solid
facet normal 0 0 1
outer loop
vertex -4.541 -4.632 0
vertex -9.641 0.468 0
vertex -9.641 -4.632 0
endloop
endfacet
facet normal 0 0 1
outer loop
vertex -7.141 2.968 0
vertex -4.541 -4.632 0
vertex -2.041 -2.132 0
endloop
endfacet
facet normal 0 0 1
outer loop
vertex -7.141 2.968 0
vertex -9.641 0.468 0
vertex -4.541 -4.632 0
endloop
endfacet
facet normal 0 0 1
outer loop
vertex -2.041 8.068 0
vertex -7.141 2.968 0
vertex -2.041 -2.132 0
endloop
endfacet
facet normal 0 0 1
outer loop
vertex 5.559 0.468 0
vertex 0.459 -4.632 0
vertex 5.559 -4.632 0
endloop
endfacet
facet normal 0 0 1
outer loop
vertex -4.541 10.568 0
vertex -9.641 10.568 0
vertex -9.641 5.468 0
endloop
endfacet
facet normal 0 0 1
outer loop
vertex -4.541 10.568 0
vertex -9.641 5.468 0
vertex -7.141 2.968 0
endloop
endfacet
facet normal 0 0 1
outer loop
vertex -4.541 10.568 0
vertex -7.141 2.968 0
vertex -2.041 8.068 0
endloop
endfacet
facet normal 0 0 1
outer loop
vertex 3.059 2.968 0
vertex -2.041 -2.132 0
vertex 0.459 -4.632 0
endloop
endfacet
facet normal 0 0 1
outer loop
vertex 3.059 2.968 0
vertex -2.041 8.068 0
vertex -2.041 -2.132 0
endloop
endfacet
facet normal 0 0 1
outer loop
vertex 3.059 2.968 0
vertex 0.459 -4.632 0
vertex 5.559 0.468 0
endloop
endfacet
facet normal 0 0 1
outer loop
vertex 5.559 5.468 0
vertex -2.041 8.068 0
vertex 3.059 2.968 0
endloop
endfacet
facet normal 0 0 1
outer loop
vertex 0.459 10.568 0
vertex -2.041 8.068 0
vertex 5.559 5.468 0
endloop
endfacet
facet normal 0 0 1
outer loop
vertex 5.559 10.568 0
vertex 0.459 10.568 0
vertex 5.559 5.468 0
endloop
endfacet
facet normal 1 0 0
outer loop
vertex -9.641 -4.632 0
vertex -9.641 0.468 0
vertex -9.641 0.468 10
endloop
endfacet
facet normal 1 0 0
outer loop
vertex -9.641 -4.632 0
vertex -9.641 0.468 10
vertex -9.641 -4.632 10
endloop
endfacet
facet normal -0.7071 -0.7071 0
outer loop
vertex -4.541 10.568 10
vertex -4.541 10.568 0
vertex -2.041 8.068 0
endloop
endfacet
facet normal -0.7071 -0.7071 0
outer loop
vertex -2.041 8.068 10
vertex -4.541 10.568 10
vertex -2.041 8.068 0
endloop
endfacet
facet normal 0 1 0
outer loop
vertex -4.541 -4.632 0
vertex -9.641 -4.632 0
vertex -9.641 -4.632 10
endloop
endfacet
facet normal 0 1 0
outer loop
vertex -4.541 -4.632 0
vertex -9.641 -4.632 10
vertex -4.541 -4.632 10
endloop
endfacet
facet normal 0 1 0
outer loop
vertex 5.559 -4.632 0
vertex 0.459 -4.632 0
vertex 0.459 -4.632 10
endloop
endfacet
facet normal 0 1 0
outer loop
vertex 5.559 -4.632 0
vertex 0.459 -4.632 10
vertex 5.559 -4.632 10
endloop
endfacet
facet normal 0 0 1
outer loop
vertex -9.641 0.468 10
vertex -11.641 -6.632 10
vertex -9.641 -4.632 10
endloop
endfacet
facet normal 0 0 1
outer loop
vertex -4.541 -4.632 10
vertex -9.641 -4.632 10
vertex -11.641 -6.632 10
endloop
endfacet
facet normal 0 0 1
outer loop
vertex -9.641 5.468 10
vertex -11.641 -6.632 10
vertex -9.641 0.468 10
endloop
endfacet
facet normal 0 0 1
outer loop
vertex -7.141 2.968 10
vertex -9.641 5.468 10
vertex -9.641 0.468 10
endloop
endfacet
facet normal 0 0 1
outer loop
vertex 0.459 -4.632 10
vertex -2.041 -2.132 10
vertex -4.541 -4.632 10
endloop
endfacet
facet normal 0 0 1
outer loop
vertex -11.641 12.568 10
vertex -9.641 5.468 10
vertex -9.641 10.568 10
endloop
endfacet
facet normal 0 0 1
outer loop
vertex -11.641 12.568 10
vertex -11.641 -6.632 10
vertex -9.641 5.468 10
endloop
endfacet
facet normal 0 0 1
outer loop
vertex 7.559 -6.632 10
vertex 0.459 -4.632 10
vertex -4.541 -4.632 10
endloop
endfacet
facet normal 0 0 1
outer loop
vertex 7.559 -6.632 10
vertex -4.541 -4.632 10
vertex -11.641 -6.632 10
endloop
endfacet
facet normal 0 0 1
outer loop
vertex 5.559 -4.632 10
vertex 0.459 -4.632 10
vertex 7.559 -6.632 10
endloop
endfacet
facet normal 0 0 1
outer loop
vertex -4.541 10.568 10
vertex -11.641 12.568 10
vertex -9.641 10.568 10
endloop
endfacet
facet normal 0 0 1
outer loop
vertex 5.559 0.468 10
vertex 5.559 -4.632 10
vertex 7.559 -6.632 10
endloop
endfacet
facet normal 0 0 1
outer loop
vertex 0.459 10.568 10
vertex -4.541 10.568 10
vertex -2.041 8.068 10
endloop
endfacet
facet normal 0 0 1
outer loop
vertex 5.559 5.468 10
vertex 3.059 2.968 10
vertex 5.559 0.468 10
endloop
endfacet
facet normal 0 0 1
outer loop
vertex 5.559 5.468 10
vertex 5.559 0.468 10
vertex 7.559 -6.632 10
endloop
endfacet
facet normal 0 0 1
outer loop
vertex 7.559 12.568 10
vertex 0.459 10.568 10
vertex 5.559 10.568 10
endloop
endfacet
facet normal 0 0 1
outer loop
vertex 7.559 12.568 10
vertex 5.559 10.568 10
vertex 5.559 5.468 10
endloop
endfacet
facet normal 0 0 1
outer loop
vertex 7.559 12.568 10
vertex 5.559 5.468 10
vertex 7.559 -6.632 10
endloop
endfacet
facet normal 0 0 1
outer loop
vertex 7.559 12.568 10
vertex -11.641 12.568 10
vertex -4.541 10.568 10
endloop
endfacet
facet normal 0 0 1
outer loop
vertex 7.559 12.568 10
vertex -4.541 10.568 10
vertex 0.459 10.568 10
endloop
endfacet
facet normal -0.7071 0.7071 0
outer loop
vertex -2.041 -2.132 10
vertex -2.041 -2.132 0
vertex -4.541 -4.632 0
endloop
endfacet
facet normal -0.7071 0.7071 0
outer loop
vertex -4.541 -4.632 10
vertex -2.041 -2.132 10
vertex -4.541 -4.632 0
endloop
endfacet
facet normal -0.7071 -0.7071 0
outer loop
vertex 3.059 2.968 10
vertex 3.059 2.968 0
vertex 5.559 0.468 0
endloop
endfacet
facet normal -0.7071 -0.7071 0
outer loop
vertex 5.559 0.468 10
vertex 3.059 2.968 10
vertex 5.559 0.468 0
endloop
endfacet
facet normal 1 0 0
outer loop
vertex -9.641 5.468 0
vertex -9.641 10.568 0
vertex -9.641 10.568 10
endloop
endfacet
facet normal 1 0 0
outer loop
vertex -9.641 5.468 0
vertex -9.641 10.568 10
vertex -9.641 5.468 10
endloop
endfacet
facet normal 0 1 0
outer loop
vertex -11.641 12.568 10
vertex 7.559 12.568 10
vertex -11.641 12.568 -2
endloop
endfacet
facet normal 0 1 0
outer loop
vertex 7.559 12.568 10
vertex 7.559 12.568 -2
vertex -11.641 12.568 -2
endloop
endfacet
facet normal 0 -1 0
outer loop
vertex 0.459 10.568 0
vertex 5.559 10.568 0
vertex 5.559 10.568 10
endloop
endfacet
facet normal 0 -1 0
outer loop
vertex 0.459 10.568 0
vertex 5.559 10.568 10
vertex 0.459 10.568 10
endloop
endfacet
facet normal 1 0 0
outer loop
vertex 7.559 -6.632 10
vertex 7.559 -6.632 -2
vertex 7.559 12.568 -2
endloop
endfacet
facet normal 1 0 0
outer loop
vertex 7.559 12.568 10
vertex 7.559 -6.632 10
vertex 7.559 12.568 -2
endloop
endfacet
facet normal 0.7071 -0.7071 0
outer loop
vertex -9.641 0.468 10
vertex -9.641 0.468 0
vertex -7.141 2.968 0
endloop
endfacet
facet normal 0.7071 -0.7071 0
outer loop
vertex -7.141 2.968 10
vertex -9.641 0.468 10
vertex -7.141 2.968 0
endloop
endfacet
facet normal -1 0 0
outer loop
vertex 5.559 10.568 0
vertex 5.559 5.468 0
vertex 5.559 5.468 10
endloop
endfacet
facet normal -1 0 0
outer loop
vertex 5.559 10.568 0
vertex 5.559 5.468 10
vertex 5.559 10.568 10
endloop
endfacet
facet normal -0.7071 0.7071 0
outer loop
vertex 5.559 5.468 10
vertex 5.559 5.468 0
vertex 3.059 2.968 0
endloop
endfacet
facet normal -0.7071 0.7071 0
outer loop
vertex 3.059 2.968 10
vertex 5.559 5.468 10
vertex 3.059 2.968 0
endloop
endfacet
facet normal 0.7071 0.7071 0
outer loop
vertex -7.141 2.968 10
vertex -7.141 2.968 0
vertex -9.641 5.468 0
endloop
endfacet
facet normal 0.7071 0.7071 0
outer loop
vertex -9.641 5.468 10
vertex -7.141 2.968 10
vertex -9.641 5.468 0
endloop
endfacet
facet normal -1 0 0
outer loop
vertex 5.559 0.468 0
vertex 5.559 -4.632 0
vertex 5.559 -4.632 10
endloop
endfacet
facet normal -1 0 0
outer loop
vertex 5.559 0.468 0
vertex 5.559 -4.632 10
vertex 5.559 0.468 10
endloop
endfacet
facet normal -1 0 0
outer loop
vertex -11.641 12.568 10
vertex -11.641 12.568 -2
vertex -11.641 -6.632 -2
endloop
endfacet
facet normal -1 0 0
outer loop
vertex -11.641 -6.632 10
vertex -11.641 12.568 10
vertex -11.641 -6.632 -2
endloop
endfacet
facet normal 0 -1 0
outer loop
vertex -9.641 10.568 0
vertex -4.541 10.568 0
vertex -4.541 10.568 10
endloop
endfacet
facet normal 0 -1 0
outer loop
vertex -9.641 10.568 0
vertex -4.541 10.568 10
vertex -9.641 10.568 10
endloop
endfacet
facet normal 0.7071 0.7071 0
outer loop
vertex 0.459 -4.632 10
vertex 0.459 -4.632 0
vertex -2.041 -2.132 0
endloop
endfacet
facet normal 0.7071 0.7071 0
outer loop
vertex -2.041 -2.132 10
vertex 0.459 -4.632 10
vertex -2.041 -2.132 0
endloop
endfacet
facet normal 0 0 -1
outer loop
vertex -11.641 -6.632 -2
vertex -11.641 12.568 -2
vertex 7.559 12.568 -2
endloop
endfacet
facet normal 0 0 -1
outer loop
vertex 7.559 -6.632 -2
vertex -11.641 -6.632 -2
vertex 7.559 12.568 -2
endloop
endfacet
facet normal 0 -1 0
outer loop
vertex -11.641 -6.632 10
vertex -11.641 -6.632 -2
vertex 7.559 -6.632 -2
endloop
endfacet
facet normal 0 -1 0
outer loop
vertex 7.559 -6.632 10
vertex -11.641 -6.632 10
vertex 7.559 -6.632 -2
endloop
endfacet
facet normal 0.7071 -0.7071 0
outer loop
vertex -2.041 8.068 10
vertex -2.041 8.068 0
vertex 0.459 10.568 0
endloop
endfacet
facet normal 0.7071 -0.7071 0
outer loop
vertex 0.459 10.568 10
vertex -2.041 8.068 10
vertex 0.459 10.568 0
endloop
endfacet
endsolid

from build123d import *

# Parameters (mm, degrees)
F1_DEPTH = 10
F2_T     = 2
F3_DEPTH = 10


with BuildPart() as f1:
    # F0 (on Top) → F1 (new body)
    with BuildSketch(Plane.XY):
        Polygon((-4.5411753677, 10.567646683), (-9.6411753677, 10.567646683), (-9.6411753677, 5.467646683), (-7.1411753677, 2.967646683), (-9.6411753677, 0.467646683), (-9.6411753677, -4.632353317), (-4.5411753677, -4.632353317), (-2.0411753677, -2.132353317), (0.4588246323, -4.632353317), (5.5588246323, -4.632353317), (5.5588246323, 0.467646683), (3.0588246323, 2.967646683), (5.5588246323, 5.467646683), (5.5588246323, 10.567646683), (0.4588246323, 10.567646683), (-2.0411753677, 8.067646683), align=None)
        Polygon((-7.1411753677, 2.967646683), (-9.6411753677, 5.467646683), (-9.6411753677, 0.467646683), align=None)
        Polygon((-2.0411753677, -2.132353317), (-4.5411753677, -4.632353317), (0.4588246323, -4.632353317), align=None)
        Polygon((5.5588246323, 0.467646683), (5.5588246323, 5.467646683), (3.0588246323, 2.967646683), align=None)
        Polygon((0.4588246323, 10.567646683), (-4.5411753677, 10.567646683), (-2.0411753677, 8.067646683), align=None)
    extrude(amount=F1_DEPTH)

    # F2
    f2_openings = [f1.faces().sort_by_distance(p)[0] for p in [
        (-2.041175, 2.967647, 10),
    ]]
    offset(amount=F2_T, openings=f2_openings, kind=Kind.INTERSECTION)

    # F0 (on Top) → F3 (join)
    with BuildSketch(Plane.XY):
        Polygon((0.4588246323, 10.567646683), (-4.5411753677, 10.567646683), (-2.0411753677, 8.067646683), align=None)
        Polygon((5.5588246323, 0.467646683), (5.5588246323, 5.467646683), (3.0588246323, 2.967646683), align=None)
        Polygon((-7.1411753677, 2.967646683), (-9.6411753677, 5.467646683), (-9.6411753677, 0.467646683), align=None)
        Polygon((-2.0411753677, -2.132353317), (-4.5411753677, -4.632353317), (0.4588246323, -4.632353317), align=None)
    extrude(amount=F3_DEPTH)


solid = f1.part
